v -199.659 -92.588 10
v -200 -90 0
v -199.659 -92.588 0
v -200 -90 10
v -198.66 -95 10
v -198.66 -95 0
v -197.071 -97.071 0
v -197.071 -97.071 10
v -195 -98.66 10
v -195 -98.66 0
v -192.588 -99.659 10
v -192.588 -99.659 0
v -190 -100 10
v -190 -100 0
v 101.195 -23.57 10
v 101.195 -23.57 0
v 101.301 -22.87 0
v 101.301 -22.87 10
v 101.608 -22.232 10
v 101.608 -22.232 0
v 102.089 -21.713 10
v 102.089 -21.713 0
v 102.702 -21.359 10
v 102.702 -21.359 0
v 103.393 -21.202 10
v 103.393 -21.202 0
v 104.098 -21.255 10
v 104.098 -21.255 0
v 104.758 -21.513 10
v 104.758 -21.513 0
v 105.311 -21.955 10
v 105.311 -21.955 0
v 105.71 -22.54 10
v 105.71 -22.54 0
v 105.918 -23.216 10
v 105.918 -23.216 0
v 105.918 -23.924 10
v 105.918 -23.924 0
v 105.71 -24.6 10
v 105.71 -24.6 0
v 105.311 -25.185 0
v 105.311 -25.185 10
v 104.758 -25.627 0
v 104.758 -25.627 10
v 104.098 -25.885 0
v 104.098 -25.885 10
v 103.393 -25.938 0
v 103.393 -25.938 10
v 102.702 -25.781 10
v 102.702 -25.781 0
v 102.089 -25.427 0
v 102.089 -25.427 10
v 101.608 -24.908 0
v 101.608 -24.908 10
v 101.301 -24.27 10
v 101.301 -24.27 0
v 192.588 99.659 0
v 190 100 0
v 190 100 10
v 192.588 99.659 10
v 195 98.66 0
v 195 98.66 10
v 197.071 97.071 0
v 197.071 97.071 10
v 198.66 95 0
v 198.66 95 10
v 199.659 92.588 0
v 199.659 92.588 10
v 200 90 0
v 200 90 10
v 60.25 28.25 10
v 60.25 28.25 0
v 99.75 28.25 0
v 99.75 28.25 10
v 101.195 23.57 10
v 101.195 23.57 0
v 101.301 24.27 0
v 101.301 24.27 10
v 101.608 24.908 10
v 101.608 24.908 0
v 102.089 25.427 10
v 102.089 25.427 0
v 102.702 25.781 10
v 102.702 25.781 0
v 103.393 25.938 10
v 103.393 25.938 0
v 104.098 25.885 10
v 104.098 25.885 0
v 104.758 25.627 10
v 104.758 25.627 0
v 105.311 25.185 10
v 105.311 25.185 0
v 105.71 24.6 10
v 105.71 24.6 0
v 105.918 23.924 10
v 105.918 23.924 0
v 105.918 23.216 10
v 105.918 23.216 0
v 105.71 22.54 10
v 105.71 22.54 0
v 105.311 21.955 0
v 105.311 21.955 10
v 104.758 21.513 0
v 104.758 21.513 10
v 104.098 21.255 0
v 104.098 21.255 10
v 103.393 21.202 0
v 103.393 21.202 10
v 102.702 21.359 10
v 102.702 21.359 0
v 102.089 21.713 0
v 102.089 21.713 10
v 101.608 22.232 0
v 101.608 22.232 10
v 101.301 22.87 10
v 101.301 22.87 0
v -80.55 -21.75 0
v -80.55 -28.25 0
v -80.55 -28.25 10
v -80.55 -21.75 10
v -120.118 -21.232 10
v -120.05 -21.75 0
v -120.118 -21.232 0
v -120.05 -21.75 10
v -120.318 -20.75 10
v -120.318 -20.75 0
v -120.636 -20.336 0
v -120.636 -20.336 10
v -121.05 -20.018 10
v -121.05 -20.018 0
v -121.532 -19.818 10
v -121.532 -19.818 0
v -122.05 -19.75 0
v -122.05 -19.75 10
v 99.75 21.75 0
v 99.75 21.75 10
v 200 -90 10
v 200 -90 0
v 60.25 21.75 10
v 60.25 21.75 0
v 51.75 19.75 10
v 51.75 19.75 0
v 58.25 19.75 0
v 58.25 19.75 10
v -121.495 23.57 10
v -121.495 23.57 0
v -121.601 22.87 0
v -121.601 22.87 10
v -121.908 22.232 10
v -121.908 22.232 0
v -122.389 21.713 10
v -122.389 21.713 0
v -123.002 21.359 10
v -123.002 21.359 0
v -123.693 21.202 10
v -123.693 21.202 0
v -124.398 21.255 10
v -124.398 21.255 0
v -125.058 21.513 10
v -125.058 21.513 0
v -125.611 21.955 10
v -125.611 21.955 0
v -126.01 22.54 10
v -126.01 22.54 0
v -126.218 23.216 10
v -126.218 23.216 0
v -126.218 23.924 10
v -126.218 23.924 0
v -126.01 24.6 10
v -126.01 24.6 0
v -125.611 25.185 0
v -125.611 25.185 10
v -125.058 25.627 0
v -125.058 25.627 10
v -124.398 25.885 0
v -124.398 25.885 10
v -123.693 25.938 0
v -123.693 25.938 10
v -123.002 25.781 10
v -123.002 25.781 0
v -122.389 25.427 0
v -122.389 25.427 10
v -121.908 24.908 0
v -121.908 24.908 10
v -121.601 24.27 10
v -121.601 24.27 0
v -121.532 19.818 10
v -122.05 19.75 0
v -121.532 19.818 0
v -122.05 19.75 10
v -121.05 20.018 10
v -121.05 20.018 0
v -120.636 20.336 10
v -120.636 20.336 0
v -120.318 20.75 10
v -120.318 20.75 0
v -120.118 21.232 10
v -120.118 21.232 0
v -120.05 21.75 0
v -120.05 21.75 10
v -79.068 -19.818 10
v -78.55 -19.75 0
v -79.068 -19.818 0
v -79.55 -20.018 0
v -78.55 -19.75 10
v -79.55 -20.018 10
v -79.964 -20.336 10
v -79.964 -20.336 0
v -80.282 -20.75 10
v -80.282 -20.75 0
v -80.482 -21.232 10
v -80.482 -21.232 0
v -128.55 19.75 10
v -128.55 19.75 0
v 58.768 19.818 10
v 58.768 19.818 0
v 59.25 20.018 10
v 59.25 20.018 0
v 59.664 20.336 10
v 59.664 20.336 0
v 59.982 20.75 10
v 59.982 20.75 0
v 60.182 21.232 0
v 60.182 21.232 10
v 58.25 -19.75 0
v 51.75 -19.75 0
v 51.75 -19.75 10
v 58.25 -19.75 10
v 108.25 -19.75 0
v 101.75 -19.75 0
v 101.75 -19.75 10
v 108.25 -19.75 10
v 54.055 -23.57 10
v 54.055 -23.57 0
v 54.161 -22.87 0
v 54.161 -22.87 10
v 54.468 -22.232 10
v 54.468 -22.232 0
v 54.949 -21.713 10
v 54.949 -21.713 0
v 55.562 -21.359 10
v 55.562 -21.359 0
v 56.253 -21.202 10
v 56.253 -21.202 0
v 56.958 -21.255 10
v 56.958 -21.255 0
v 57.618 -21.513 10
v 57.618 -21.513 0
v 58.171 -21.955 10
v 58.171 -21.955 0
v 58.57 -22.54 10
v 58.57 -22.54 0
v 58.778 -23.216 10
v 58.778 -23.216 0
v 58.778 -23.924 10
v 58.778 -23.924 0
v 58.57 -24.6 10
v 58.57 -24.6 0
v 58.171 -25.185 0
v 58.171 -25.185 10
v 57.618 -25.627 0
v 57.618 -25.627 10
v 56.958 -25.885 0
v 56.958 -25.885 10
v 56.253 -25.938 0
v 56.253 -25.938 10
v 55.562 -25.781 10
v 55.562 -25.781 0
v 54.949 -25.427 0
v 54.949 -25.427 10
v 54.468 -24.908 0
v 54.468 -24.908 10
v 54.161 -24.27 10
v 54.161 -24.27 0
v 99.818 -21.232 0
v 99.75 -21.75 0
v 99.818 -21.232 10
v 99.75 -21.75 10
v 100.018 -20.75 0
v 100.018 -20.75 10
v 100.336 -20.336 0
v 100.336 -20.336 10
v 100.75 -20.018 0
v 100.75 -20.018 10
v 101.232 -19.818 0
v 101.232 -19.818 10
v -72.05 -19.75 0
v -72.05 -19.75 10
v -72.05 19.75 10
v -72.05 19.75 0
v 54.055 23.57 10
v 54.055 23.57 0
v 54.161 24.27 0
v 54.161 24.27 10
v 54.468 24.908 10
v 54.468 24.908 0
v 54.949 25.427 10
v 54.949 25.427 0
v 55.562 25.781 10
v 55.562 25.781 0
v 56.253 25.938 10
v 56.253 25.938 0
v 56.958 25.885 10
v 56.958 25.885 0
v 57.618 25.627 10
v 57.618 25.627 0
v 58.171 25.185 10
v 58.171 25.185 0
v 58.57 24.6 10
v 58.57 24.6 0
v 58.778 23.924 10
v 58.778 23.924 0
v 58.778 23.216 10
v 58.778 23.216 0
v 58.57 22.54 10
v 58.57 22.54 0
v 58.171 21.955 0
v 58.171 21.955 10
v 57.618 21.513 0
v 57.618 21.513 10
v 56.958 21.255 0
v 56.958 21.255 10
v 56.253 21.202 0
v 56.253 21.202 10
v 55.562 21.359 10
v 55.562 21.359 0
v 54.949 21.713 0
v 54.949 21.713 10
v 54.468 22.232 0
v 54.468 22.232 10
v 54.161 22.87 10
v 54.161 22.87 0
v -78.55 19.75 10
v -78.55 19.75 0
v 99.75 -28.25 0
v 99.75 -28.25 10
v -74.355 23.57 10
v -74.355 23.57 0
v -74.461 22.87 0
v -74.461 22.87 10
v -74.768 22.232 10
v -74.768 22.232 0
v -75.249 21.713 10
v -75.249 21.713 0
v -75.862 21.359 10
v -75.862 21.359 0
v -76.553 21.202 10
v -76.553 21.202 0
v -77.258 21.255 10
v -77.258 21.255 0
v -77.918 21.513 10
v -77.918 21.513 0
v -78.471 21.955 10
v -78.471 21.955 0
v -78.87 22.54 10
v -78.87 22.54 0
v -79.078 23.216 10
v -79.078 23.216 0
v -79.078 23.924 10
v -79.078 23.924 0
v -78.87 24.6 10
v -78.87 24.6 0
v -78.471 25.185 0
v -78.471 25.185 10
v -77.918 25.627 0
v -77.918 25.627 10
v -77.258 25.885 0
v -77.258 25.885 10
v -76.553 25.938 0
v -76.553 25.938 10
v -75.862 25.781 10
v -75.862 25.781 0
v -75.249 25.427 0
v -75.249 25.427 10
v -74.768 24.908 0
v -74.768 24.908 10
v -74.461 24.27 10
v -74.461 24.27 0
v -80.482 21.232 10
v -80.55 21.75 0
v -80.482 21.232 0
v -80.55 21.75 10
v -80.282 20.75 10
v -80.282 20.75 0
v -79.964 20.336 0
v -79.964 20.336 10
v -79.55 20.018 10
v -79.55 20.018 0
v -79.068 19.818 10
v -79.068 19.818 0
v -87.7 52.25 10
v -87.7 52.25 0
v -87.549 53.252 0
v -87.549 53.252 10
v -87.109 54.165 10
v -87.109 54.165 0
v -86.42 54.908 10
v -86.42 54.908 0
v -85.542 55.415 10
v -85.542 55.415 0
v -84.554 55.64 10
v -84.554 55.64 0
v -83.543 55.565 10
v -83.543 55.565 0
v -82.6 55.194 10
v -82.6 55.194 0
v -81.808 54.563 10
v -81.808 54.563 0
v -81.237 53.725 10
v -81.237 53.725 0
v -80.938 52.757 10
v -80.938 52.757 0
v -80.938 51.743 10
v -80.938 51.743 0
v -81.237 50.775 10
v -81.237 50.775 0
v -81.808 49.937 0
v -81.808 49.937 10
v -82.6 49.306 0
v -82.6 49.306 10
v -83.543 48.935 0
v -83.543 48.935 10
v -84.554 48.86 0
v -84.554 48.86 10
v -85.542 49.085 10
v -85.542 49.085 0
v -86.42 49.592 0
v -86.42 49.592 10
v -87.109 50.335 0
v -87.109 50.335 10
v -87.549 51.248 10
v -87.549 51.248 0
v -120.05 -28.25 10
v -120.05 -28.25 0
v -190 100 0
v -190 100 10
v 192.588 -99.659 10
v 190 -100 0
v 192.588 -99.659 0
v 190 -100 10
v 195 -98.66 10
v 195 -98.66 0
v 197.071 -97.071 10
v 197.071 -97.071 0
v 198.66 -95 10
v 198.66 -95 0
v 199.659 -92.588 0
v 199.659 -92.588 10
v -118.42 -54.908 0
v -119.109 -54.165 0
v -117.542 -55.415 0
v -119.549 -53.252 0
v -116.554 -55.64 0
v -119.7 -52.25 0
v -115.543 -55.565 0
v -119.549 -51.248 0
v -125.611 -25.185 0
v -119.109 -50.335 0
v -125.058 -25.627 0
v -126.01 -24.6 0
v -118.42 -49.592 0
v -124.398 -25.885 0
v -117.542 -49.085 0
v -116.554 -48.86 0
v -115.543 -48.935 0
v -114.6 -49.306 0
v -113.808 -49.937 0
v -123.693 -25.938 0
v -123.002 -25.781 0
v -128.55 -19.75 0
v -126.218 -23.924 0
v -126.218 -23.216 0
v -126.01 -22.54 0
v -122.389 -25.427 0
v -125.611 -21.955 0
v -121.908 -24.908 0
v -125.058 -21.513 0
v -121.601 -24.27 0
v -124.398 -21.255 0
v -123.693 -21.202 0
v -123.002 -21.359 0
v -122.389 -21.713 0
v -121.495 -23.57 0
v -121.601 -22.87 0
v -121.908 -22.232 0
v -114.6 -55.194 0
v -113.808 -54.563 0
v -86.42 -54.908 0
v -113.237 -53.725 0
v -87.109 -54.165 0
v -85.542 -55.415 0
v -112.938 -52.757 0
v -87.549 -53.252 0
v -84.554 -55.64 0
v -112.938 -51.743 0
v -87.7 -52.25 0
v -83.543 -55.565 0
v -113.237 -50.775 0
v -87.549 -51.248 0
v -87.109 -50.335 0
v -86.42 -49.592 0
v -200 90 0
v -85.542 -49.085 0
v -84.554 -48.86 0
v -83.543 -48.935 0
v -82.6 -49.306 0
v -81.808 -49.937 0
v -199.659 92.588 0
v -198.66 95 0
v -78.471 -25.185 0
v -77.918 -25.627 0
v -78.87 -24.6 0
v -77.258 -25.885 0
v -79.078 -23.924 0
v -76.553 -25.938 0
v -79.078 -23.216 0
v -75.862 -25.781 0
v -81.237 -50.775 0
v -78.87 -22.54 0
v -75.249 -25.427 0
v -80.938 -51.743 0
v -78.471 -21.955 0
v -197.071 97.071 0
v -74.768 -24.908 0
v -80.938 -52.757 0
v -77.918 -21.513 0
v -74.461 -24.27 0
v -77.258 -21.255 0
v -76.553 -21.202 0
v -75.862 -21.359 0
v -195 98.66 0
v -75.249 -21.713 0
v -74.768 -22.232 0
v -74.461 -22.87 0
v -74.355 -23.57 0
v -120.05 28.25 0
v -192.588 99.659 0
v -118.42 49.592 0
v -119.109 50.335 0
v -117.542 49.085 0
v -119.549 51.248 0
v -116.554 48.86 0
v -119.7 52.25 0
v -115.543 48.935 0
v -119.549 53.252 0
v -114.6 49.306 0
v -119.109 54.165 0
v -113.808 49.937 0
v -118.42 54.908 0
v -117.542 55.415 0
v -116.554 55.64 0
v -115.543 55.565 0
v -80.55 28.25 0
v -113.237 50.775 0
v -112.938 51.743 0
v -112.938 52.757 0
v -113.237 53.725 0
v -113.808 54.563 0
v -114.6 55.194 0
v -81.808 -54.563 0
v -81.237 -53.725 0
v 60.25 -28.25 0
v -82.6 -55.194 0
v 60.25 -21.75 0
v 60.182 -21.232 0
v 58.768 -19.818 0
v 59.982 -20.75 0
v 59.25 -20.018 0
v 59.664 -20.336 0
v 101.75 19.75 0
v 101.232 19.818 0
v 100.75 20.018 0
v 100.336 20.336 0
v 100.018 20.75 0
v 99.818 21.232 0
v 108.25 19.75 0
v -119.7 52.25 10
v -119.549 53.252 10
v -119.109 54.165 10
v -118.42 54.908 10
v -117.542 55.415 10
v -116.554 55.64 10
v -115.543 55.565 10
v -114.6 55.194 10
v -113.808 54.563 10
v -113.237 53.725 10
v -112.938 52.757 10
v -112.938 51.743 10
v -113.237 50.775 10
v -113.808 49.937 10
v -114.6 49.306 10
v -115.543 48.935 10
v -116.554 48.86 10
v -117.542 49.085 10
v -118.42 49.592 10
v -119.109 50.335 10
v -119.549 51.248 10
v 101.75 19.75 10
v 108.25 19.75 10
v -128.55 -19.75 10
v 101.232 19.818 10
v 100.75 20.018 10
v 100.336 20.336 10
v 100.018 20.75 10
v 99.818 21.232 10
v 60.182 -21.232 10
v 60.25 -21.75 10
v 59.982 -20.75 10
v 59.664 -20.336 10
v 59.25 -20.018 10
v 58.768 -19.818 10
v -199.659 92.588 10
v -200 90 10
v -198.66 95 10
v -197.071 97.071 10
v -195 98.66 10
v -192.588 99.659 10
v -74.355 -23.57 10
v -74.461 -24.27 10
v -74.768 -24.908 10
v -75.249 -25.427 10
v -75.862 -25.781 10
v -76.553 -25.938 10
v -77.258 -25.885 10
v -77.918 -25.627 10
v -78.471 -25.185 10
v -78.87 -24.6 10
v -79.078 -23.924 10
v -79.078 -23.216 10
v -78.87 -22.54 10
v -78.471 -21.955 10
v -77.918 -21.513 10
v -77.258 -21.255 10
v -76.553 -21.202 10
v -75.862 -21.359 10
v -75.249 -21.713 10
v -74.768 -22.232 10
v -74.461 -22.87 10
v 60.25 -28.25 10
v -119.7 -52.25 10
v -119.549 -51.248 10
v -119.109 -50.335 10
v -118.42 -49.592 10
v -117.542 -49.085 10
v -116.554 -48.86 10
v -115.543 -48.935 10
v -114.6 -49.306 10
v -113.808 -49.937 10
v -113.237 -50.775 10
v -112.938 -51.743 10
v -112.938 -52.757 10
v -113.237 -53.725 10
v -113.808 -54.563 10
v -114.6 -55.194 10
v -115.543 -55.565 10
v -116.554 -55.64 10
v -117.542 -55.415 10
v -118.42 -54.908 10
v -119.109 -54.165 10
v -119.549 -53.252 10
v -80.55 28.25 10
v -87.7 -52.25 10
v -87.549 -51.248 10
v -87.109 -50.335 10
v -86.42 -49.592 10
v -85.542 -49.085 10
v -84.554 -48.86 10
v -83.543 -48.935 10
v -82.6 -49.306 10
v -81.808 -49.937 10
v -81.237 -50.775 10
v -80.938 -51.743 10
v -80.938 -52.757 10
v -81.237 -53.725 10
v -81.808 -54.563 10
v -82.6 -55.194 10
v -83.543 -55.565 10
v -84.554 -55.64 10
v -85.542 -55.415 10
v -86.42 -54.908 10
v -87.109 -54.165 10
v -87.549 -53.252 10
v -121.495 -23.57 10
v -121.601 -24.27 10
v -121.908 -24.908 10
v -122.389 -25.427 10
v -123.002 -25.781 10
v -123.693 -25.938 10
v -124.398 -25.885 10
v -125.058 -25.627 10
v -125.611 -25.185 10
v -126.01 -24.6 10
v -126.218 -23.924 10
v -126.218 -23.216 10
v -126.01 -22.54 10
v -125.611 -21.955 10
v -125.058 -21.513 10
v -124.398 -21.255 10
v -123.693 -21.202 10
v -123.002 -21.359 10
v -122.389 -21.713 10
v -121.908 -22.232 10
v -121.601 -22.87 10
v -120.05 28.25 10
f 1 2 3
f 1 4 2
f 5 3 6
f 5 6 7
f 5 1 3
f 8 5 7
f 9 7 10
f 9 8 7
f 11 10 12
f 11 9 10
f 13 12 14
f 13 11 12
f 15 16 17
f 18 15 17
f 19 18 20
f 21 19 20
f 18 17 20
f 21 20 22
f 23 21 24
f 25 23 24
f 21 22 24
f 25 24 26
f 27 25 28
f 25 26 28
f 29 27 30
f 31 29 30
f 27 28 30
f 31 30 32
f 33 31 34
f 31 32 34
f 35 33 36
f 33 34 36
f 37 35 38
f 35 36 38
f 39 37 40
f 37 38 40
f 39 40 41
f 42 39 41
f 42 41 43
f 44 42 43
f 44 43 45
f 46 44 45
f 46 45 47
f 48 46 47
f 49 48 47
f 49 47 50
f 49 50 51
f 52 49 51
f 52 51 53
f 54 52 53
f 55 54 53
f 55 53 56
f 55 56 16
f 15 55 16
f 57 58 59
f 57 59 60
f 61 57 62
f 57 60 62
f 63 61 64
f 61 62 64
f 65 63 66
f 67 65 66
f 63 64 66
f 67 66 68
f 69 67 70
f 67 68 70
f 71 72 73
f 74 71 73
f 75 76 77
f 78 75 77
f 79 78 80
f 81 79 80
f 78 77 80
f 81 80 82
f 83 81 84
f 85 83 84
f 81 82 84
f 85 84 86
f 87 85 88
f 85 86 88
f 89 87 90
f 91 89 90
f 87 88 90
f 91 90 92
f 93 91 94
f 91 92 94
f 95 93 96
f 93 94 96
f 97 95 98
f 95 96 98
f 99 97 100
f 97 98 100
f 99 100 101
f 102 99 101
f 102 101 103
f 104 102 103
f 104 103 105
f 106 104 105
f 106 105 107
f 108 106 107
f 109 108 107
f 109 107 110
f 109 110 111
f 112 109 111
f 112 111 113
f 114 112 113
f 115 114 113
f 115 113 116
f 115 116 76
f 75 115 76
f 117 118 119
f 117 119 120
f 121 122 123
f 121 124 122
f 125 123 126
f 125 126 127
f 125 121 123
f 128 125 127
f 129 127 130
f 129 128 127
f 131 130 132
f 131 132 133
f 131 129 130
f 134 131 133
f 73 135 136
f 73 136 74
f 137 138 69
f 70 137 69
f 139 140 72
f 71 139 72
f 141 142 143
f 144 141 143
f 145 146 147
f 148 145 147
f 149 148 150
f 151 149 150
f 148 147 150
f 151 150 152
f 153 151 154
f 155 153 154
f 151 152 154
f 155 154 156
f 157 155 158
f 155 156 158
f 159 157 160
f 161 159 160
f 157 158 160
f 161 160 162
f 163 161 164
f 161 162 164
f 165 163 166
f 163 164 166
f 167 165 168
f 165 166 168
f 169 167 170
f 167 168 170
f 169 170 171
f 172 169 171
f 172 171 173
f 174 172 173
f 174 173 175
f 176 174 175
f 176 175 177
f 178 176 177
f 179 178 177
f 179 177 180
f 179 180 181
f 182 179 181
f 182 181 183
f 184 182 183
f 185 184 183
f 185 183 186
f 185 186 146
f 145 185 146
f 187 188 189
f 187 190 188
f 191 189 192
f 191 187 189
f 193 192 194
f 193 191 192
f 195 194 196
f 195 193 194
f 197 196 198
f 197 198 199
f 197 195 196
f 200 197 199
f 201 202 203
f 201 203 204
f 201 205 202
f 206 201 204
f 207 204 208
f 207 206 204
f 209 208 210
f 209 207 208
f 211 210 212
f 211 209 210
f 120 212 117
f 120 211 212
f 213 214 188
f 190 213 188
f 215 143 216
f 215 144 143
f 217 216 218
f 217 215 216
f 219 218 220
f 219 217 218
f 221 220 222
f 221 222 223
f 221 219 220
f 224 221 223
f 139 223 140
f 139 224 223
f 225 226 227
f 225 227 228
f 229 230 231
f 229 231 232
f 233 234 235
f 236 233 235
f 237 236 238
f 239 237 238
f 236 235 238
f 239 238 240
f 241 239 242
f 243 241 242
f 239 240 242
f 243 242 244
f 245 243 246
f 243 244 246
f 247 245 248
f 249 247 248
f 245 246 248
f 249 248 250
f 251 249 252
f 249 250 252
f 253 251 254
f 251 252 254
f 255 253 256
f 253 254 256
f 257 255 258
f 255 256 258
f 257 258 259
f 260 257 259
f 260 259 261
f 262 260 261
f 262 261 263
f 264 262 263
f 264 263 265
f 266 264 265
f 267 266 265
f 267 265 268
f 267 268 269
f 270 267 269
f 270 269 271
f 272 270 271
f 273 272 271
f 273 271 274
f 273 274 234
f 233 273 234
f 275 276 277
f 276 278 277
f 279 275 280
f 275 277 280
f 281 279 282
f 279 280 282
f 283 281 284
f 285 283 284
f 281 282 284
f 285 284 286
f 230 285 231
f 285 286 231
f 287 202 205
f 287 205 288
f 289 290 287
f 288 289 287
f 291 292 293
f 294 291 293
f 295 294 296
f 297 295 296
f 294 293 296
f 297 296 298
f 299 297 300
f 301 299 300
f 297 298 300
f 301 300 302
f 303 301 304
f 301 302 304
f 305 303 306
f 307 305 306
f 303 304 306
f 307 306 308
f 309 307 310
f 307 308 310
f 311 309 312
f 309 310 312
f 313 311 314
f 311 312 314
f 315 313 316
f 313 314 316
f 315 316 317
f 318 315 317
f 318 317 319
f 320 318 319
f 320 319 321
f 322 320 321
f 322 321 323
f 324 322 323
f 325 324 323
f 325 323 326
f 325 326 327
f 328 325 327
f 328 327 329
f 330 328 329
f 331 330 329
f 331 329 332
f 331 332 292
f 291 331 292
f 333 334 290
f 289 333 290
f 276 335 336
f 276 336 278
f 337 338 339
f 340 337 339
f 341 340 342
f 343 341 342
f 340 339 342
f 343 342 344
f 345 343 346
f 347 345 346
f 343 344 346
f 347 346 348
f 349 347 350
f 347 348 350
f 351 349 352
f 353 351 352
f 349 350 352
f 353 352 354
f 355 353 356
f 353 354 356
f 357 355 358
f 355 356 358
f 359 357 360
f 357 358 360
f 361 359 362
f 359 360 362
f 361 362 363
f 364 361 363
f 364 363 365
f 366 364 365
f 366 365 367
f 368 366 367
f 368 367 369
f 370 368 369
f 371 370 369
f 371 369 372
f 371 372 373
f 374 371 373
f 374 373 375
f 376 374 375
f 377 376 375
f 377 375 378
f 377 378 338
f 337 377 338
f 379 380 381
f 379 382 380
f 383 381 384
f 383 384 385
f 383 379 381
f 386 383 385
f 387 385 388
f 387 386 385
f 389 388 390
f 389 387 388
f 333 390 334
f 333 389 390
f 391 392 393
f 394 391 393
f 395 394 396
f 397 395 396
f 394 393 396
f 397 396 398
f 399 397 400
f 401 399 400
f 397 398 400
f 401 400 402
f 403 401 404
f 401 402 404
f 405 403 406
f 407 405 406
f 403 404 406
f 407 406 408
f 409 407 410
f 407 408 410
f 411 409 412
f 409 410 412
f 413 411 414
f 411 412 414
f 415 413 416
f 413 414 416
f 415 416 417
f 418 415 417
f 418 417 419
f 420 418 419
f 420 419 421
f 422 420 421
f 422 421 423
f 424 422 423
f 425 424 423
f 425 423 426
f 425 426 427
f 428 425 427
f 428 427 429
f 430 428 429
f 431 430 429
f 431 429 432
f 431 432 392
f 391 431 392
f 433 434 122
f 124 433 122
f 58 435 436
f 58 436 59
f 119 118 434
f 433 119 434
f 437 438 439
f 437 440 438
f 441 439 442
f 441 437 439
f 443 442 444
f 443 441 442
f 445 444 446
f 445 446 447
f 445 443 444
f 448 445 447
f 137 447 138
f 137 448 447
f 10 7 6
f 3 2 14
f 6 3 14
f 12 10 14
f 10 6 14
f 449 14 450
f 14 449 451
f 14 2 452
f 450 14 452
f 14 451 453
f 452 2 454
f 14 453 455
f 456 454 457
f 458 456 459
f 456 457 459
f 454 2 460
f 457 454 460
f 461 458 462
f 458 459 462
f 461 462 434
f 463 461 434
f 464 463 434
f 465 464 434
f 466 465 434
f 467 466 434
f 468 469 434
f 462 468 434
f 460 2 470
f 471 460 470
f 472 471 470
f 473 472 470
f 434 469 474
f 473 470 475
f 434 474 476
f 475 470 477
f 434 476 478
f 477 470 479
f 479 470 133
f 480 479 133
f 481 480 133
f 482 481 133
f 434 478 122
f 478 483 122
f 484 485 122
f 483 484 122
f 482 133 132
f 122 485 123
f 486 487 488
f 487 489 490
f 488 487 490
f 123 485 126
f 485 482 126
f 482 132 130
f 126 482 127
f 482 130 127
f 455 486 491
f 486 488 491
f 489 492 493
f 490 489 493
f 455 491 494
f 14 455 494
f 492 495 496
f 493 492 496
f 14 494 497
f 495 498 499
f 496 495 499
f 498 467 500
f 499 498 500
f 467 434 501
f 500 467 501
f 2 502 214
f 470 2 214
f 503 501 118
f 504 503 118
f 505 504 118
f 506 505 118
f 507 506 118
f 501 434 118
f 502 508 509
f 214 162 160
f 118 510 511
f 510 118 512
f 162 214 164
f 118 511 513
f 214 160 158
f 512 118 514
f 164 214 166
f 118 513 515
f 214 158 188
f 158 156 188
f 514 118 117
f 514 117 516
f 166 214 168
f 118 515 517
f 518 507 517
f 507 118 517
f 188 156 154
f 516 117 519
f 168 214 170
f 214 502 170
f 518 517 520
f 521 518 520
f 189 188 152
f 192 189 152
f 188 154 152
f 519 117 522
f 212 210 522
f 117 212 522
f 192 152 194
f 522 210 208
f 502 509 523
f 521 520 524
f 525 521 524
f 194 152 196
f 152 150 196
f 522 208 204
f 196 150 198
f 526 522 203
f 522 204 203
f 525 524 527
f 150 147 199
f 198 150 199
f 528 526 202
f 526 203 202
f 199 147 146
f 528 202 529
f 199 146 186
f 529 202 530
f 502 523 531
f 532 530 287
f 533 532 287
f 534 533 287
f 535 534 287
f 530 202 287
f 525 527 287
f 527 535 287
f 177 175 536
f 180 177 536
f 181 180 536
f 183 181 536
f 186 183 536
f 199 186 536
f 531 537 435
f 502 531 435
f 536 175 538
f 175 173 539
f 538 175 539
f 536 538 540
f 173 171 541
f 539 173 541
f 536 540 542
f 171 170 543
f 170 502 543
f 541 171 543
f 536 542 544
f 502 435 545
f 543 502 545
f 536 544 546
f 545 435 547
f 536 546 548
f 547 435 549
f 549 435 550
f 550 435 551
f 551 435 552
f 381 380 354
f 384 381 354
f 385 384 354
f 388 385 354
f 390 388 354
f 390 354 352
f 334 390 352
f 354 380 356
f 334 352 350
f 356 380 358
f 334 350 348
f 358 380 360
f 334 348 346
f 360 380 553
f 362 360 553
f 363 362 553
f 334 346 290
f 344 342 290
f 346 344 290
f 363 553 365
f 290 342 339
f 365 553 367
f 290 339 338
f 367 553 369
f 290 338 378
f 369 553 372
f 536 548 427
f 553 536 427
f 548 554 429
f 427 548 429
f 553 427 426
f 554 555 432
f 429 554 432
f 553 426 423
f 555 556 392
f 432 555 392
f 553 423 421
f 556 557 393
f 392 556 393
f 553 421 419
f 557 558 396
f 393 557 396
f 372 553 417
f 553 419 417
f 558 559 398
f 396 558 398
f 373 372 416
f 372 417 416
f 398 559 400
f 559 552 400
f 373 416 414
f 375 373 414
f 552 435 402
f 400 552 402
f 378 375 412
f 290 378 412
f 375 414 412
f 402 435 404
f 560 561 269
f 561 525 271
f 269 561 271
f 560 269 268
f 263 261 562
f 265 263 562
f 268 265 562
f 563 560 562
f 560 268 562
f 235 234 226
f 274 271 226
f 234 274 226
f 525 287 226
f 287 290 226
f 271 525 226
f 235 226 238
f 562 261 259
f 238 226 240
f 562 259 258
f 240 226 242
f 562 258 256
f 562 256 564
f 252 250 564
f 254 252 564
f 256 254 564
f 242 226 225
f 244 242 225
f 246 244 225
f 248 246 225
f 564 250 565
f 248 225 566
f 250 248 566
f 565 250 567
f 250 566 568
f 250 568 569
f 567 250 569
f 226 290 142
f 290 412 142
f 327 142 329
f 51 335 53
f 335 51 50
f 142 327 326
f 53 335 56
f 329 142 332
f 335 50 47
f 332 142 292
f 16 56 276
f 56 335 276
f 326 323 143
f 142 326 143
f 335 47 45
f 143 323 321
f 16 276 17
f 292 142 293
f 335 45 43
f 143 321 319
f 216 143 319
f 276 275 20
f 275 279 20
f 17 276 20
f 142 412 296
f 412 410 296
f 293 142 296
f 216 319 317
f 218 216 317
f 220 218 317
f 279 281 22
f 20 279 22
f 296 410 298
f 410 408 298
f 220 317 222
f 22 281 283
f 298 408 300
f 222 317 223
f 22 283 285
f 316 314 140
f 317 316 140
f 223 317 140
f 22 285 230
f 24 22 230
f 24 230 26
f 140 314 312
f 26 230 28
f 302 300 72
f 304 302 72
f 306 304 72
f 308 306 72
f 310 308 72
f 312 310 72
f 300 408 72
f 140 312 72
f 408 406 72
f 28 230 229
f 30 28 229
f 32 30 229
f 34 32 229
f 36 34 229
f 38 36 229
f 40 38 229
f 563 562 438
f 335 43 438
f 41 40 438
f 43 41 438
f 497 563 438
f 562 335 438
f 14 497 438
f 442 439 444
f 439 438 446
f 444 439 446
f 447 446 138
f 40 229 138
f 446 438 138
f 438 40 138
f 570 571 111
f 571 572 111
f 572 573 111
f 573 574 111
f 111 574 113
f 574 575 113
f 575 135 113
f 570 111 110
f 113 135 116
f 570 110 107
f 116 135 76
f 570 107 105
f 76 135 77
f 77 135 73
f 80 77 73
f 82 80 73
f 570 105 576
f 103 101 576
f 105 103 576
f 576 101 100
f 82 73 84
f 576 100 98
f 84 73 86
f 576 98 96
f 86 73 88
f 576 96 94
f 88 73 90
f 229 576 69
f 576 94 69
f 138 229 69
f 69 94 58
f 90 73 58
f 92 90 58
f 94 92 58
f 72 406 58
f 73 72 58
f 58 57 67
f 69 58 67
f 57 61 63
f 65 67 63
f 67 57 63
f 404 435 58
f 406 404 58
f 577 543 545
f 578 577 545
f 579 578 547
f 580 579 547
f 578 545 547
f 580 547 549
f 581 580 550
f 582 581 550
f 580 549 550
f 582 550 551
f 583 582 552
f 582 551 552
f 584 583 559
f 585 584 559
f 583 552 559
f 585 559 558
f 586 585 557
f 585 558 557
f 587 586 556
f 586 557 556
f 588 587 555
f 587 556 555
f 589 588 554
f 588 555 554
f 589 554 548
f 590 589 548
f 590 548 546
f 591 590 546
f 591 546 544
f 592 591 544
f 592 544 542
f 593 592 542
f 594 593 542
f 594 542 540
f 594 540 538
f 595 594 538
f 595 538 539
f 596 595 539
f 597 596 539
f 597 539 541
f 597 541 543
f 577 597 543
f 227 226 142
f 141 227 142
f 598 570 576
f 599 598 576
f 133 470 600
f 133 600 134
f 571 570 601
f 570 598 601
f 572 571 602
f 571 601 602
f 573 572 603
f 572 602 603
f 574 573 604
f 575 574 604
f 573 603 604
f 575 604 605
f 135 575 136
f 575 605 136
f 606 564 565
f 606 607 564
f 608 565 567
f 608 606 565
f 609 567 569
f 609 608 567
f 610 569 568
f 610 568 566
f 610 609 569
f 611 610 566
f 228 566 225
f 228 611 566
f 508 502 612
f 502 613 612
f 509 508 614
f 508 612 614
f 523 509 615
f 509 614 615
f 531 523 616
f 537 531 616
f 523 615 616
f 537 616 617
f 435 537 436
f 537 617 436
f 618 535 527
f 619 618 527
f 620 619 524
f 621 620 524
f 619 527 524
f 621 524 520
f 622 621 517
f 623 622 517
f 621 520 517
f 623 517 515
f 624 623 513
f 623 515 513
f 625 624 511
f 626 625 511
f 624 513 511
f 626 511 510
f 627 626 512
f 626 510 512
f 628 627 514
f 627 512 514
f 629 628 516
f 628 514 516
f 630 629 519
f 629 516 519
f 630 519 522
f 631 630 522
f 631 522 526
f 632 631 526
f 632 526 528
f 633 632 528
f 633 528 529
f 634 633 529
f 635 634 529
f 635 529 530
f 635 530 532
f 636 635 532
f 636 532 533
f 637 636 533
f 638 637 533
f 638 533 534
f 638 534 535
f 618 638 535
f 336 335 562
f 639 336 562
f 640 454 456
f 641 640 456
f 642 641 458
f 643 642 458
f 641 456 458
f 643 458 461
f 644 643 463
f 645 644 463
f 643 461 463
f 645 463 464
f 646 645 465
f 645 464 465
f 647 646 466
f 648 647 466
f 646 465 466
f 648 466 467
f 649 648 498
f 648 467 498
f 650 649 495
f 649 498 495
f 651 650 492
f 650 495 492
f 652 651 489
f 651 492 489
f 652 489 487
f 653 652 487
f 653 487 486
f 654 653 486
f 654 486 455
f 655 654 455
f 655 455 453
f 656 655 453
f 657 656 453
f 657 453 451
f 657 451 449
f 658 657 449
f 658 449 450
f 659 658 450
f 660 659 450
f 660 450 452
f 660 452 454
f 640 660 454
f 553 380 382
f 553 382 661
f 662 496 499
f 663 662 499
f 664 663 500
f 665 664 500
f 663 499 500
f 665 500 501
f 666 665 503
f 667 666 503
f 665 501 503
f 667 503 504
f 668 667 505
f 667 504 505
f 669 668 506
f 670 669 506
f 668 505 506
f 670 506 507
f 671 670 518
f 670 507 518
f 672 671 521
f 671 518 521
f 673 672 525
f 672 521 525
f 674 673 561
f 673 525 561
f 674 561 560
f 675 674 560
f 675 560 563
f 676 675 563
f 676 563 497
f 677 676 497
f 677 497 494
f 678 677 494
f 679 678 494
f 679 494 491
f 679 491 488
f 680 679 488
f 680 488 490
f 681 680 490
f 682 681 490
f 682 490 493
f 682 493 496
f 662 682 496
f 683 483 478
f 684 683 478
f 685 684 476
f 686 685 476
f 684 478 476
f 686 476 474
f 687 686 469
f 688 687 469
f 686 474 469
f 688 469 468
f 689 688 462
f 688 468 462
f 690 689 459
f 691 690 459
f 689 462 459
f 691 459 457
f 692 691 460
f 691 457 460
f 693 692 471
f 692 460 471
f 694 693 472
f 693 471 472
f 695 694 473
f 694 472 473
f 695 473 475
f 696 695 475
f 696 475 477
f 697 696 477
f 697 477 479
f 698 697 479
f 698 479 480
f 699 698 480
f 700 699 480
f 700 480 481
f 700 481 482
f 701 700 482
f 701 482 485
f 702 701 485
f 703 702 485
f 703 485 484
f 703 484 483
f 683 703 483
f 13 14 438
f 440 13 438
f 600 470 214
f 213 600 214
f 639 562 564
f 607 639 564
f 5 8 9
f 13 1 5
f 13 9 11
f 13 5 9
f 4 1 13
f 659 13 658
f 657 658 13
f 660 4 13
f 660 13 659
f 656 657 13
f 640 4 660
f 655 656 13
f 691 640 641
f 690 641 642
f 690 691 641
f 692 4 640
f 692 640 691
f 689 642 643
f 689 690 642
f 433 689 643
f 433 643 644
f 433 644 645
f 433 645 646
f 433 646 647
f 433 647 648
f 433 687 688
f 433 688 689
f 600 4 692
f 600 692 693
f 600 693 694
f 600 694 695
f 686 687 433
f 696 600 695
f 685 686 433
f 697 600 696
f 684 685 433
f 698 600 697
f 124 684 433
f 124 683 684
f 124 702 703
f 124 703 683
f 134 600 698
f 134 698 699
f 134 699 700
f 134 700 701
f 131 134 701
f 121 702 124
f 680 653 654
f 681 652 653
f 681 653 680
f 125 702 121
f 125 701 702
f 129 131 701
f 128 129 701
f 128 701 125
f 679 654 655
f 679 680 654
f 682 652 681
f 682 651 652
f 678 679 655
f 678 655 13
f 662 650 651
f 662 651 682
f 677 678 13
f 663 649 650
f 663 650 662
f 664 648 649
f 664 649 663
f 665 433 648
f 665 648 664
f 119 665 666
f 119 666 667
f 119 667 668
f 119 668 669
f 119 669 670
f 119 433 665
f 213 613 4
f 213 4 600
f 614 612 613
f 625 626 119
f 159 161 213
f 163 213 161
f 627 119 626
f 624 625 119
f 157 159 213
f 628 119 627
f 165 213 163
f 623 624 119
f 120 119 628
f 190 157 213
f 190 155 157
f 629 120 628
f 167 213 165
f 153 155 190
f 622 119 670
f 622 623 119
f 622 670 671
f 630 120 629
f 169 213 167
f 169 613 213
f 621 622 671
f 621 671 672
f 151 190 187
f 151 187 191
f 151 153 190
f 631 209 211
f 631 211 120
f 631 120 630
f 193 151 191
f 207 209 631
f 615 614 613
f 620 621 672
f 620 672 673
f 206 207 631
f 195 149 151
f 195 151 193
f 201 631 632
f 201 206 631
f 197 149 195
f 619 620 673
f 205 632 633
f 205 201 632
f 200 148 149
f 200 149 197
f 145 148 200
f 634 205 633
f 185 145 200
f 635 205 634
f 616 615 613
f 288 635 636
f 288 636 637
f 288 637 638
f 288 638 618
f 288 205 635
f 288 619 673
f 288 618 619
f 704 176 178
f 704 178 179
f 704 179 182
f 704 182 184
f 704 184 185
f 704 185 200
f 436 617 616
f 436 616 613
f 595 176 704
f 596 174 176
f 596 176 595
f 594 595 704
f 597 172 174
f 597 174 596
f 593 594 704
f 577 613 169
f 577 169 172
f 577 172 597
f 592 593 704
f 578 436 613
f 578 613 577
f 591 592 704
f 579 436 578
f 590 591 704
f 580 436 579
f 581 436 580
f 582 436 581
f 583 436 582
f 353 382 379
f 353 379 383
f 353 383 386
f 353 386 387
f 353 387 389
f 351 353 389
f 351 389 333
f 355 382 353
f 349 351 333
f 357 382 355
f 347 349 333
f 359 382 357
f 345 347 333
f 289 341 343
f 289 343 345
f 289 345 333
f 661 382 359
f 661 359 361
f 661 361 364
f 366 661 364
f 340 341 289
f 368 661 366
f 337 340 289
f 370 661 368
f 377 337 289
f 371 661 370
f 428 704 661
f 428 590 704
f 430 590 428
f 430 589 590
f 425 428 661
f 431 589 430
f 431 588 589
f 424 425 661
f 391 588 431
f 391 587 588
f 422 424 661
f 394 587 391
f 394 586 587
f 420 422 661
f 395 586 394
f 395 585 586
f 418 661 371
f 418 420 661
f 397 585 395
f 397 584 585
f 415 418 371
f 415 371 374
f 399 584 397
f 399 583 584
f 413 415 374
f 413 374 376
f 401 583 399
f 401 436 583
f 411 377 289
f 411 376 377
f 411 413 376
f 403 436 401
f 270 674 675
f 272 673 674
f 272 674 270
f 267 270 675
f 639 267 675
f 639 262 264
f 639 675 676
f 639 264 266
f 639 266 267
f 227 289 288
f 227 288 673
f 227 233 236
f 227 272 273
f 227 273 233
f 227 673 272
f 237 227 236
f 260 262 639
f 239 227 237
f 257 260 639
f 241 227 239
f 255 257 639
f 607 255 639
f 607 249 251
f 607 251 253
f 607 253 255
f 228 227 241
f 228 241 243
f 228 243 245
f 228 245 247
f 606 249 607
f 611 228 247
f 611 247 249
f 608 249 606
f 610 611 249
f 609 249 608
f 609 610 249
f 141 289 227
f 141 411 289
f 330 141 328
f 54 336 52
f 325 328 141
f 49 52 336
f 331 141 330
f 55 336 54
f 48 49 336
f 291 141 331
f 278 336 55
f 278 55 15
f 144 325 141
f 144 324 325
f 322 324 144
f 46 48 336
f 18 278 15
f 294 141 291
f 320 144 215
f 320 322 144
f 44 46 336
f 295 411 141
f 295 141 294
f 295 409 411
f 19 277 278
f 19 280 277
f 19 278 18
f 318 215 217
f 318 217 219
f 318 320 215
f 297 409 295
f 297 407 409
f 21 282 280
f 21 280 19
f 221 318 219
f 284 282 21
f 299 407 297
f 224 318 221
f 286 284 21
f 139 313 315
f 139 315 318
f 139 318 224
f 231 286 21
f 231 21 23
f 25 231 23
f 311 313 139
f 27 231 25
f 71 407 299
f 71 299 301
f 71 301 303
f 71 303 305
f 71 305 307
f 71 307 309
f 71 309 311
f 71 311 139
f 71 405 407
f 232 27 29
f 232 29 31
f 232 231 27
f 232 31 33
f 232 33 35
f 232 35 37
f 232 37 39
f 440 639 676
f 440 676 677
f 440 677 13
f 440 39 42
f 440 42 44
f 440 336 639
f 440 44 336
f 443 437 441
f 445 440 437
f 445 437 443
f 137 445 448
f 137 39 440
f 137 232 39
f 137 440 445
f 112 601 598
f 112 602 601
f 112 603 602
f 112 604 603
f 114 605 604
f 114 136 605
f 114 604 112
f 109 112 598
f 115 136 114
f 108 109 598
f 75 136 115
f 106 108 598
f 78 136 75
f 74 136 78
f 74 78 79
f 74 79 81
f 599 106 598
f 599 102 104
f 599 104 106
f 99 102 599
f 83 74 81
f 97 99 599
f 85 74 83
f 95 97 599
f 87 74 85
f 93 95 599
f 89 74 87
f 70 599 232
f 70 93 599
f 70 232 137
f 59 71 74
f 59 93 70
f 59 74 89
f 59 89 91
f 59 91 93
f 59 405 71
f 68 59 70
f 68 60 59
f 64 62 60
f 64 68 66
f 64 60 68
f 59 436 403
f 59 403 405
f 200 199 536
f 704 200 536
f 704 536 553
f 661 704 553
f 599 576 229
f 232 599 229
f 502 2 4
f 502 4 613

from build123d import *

# Parameters (mm, degrees)
SKETCH1_W           = 400
SKETCH1_H           = 200
SKETCH1_W_2         = 8.5
SKETCH1_H_2         = 8.5
BOSS_EXTRUDE1_DEPTH = 10
FILLET2_R           = 2
CUT_EXTRUDE1_REACH  = 225.83
SKETCH2_R           = 2.375
FILLET3_R           = 10
SKETCH3_R           = 3.4
CUT_EXTRUDE3_DEPTH  = 20


with BuildPart() as part:
    # Sketch1 → Boss-Extrude1 (new body)
    # profile 1 of 9: a face of its own
    with BuildSketch(Plane.XY):
        Rectangle(SKETCH1_W, SKETCH1_H)
        Polygon((-128.55, 28.25), (-120.05, 28.25), (-80.55, 28.25), (-72.05, 28.25), (-72.05, 19.75), (-72.05, -19.75), (-72.05, -28.25), (-80.55, -28.25), (-120.05, -28.25), (-128.55, -28.25), (-128.55, -19.75), (-128.55, 19.75), align=None, mode=Mode.SUBTRACT)
        Polygon((51.75, 19.75), (51.75, 28.25), (60.25, 28.25), (99.75, 28.25), (108.25, 28.25), (108.25, 19.75), (108.25, -19.75), (108.25, -28.25), (99.75, -28.25), (60.25, -28.25), (51.75, -28.25), (51.75, -19.75), align=None, mode=Mode.SUBTRACT)
    # profile 2 of 9: a face of its own
    with BuildSketch(Plane.XY):
        with Locations((-124.3, 24)):
            Rectangle(SKETCH1_W_2, SKETCH1_H_2)
    # profile 3 of 9: a face of its own
    with BuildSketch(Plane.XY):
        with Locations((-76.3, 24)):
            Rectangle(SKETCH1_W_2, SKETCH1_H_2)
    # profile 4 of 9: a face of its own
    with BuildSketch(Plane.XY):
        with Locations((-76.3, -24)):
            Rectangle(SKETCH1_W_2, SKETCH1_H_2)
    # profile 5 of 9: a face of its own
    with BuildSketch(Plane.XY):
        with Locations((-124.3, -24)):
            Rectangle(SKETCH1_W_2, SKETCH1_H_2)
    # profile 6 of 9: a face of its own
    with BuildSketch(Plane.XY):
        with Locations((56, -24)):
            Rectangle(SKETCH1_W_2, SKETCH1_H_2)
    # profile 7 of 9: a face of its own
    with BuildSketch(Plane.XY):
        with Locations((56, 24)):
            Rectangle(SKETCH1_W_2, SKETCH1_H_2)
    # profile 8 of 9: a face of its own
    with BuildSketch(Plane.XY):
        with Locations((104, 24)):
            Rectangle(SKETCH1_W_2, SKETCH1_H_2)
    # profile 9 of 9: a face of its own
    with BuildSketch(Plane.XY):
        with Locations((104, -24)):
            Rectangle(SKETCH1_W_2, SKETCH1_H_2)
    extrude(amount=BOSS_EXTRUDE1_DEPTH)

    # Fillet2
    fillet2_edges = [part.edges().sort_by_distance(p)[0] for p in [
        (60.25, 19.75, 5),
        (60.25, -19.75, 5),
        (99.75, -19.75, 5),
        (99.75, 19.75, 5),
        (-80.55, 19.75, 5),
        (-120.05, 19.75, 5),
        (-120.05, -19.75, 5),
        (-80.55, -19.75, 5),
    ]]
    fillet(fillet2_edges, radius=FILLET2_R)

    # Sketch2 → Cut-Extrude1 (cut, up to next)
    with BuildSketch(Plane(origin=(0, 0, 0), x_dir=(-1, 0, 0), z_dir=(0, 0, -1)), mode=Mode.PRIVATE) as cut_extrude1_sk1:
        with Locations((-103.57, 23.57)):
            Circle(SKETCH2_R)
    cut_extrude1_tool1 = extrude(cut_extrude1_sk1.sketch, amount=-CUT_EXTRUDE1_REACH, mode=Mode.PRIVATE) & part.part
    # Sketch2 → Cut-Extrude1 (cut, up to next)
    with BuildSketch(Plane(origin=(0, 0, 0), x_dir=(-1, 0, 0), z_dir=(0, 0, -1)), mode=Mode.PRIVATE) as cut_extrude1_sk2:
        with Locations((-56.43, 23.57)):
            Circle(SKETCH2_R)
    cut_extrude1_tool2 = extrude(cut_extrude1_sk2.sketch, amount=-CUT_EXTRUDE1_REACH, mode=Mode.PRIVATE) & part.part
    # Sketch2 → Cut-Extrude1 (cut, up to next)
    with BuildSketch(Plane(origin=(0, 0, 0), x_dir=(-1, 0, 0), z_dir=(0, 0, -1)), mode=Mode.PRIVATE) as cut_extrude1_sk3:
        with Locations((-56.43, -23.57)):
            Circle(SKETCH2_R)
    cut_extrude1_tool3 = extrude(cut_extrude1_sk3.sketch, amount=-CUT_EXTRUDE1_REACH, mode=Mode.PRIVATE) & part.part
    # Sketch2 → Cut-Extrude1 (cut, up to next)
    with BuildSketch(Plane(origin=(0, 0, 0), x_dir=(-1, 0, 0), z_dir=(0, 0, -1)), mode=Mode.PRIVATE) as cut_extrude1_sk4:
        with Locations((-103.57, -23.57)):
            Circle(SKETCH2_R)
    cut_extrude1_tool4 = extrude(cut_extrude1_sk4.sketch, amount=-CUT_EXTRUDE1_REACH, mode=Mode.PRIVATE) & part.part
    # Sketch2 → Cut-Extrude1 (cut, up to next)
    with BuildSketch(Plane(origin=(0, 0, 0), x_dir=(-1, 0, 0), z_dir=(0, 0, -1)), mode=Mode.PRIVATE) as cut_extrude1_sk5:
        with Locations(Location((123.87, -23.57, 0), (0, 0, 180))):
            Circle(SKETCH2_R)
    cut_extrude1_tool5 = extrude(cut_extrude1_sk5.sketch, amount=-CUT_EXTRUDE1_REACH, mode=Mode.PRIVATE) & part.part
    # Sketch2 → Cut-Extrude1 (cut, up to next)
    with BuildSketch(Plane(origin=(0, 0, 0), x_dir=(-1, 0, 0), z_dir=(0, 0, -1)), mode=Mode.PRIVATE) as cut_extrude1_sk6:
        with Locations(Location((76.73, -23.57, 0), (0, 0, 180))):
            Circle(SKETCH2_R)
    cut_extrude1_tool6 = extrude(cut_extrude1_sk6.sketch, amount=-CUT_EXTRUDE1_REACH, mode=Mode.PRIVATE) & part.part
    # Sketch2 → Cut-Extrude1 (cut, up to next)
    with BuildSketch(Plane(origin=(0, 0, 0), x_dir=(-1, 0, 0), z_dir=(0, 0, -1)), mode=Mode.PRIVATE) as cut_extrude1_sk7:
        with Locations(Location((76.73, 23.57, 0), (0, 0, 180))):
            Circle(SKETCH2_R)
    cut_extrude1_tool7 = extrude(cut_extrude1_sk7.sketch, amount=-CUT_EXTRUDE1_REACH, mode=Mode.PRIVATE) & part.part
    # Sketch2 → Cut-Extrude1 (cut, up to next)
    with BuildSketch(Plane(origin=(0, 0, 0), x_dir=(-1, 0, 0), z_dir=(0, 0, -1)), mode=Mode.PRIVATE) as cut_extrude1_sk8:
        with Locations(Location((123.87, 23.57, 0), (0, 0, 180))):
            Circle(SKETCH2_R)
    cut_extrude1_tool8 = extrude(cut_extrude1_sk8.sketch, amount=-CUT_EXTRUDE1_REACH, mode=Mode.PRIVATE) & part.part
    add(cut_extrude1_tool1.solids().sort_by_distance((103.57, 23.57, 0))[0], mode=Mode.SUBTRACT)
    add(cut_extrude1_tool2.solids().sort_by_distance((56.43, 23.57, 0))[0], mode=Mode.SUBTRACT)
    add(cut_extrude1_tool3.solids().sort_by_distance((56.43, -23.57, 0))[0], mode=Mode.SUBTRACT)
    add(cut_extrude1_tool4.solids().sort_by_distance((103.57, -23.57, 0))[0], mode=Mode.SUBTRACT)
    add(cut_extrude1_tool5.solids().sort_by_distance((-123.87, -23.57, 0))[0], mode=Mode.SUBTRACT)
    add(cut_extrude1_tool6.solids().sort_by_distance((-76.73, -23.57, 0))[0], mode=Mode.SUBTRACT)
    add(cut_extrude1_tool7.solids().sort_by_distance((-76.73, 23.57, 0))[0], mode=Mode.SUBTRACT)
    add(cut_extrude1_tool8.solids().sort_by_distance((-123.87, 23.57, 0))[0], mode=Mode.SUBTRACT)

    # Fillet3
    fillet3_edges = [part.edges().sort_by_distance(p)[0] for p in [
        (-200, 100, 5),
        (200, 100, 5),
        (200, -100, 5),
        (-200, -100, 5),
    ]]
    fillet(fillet3_edges, radius=FILLET3_R)

    # Sketch3 → Cut-Extrude3 (cut)
    with BuildSketch(Plane(origin=(0, 0, 0), x_dir=(-1, 0, 0), z_dir=(0, 0, -1))):
        with Locations((84.3, -52.25)):
            Circle(SKETCH3_R)
        with Locations((116.3, -52.25)):
            Circle(SKETCH3_R)
        with Locations((84.3, 52.25)):
            Circle(SKETCH3_R)
        with Locations((116.3, 52.25)):
            Circle(SKETCH3_R)
    extrude(amount=-CUT_EXTRUDE3_DEPTH, mode=Mode.SUBTRACT)


solid = part.part
